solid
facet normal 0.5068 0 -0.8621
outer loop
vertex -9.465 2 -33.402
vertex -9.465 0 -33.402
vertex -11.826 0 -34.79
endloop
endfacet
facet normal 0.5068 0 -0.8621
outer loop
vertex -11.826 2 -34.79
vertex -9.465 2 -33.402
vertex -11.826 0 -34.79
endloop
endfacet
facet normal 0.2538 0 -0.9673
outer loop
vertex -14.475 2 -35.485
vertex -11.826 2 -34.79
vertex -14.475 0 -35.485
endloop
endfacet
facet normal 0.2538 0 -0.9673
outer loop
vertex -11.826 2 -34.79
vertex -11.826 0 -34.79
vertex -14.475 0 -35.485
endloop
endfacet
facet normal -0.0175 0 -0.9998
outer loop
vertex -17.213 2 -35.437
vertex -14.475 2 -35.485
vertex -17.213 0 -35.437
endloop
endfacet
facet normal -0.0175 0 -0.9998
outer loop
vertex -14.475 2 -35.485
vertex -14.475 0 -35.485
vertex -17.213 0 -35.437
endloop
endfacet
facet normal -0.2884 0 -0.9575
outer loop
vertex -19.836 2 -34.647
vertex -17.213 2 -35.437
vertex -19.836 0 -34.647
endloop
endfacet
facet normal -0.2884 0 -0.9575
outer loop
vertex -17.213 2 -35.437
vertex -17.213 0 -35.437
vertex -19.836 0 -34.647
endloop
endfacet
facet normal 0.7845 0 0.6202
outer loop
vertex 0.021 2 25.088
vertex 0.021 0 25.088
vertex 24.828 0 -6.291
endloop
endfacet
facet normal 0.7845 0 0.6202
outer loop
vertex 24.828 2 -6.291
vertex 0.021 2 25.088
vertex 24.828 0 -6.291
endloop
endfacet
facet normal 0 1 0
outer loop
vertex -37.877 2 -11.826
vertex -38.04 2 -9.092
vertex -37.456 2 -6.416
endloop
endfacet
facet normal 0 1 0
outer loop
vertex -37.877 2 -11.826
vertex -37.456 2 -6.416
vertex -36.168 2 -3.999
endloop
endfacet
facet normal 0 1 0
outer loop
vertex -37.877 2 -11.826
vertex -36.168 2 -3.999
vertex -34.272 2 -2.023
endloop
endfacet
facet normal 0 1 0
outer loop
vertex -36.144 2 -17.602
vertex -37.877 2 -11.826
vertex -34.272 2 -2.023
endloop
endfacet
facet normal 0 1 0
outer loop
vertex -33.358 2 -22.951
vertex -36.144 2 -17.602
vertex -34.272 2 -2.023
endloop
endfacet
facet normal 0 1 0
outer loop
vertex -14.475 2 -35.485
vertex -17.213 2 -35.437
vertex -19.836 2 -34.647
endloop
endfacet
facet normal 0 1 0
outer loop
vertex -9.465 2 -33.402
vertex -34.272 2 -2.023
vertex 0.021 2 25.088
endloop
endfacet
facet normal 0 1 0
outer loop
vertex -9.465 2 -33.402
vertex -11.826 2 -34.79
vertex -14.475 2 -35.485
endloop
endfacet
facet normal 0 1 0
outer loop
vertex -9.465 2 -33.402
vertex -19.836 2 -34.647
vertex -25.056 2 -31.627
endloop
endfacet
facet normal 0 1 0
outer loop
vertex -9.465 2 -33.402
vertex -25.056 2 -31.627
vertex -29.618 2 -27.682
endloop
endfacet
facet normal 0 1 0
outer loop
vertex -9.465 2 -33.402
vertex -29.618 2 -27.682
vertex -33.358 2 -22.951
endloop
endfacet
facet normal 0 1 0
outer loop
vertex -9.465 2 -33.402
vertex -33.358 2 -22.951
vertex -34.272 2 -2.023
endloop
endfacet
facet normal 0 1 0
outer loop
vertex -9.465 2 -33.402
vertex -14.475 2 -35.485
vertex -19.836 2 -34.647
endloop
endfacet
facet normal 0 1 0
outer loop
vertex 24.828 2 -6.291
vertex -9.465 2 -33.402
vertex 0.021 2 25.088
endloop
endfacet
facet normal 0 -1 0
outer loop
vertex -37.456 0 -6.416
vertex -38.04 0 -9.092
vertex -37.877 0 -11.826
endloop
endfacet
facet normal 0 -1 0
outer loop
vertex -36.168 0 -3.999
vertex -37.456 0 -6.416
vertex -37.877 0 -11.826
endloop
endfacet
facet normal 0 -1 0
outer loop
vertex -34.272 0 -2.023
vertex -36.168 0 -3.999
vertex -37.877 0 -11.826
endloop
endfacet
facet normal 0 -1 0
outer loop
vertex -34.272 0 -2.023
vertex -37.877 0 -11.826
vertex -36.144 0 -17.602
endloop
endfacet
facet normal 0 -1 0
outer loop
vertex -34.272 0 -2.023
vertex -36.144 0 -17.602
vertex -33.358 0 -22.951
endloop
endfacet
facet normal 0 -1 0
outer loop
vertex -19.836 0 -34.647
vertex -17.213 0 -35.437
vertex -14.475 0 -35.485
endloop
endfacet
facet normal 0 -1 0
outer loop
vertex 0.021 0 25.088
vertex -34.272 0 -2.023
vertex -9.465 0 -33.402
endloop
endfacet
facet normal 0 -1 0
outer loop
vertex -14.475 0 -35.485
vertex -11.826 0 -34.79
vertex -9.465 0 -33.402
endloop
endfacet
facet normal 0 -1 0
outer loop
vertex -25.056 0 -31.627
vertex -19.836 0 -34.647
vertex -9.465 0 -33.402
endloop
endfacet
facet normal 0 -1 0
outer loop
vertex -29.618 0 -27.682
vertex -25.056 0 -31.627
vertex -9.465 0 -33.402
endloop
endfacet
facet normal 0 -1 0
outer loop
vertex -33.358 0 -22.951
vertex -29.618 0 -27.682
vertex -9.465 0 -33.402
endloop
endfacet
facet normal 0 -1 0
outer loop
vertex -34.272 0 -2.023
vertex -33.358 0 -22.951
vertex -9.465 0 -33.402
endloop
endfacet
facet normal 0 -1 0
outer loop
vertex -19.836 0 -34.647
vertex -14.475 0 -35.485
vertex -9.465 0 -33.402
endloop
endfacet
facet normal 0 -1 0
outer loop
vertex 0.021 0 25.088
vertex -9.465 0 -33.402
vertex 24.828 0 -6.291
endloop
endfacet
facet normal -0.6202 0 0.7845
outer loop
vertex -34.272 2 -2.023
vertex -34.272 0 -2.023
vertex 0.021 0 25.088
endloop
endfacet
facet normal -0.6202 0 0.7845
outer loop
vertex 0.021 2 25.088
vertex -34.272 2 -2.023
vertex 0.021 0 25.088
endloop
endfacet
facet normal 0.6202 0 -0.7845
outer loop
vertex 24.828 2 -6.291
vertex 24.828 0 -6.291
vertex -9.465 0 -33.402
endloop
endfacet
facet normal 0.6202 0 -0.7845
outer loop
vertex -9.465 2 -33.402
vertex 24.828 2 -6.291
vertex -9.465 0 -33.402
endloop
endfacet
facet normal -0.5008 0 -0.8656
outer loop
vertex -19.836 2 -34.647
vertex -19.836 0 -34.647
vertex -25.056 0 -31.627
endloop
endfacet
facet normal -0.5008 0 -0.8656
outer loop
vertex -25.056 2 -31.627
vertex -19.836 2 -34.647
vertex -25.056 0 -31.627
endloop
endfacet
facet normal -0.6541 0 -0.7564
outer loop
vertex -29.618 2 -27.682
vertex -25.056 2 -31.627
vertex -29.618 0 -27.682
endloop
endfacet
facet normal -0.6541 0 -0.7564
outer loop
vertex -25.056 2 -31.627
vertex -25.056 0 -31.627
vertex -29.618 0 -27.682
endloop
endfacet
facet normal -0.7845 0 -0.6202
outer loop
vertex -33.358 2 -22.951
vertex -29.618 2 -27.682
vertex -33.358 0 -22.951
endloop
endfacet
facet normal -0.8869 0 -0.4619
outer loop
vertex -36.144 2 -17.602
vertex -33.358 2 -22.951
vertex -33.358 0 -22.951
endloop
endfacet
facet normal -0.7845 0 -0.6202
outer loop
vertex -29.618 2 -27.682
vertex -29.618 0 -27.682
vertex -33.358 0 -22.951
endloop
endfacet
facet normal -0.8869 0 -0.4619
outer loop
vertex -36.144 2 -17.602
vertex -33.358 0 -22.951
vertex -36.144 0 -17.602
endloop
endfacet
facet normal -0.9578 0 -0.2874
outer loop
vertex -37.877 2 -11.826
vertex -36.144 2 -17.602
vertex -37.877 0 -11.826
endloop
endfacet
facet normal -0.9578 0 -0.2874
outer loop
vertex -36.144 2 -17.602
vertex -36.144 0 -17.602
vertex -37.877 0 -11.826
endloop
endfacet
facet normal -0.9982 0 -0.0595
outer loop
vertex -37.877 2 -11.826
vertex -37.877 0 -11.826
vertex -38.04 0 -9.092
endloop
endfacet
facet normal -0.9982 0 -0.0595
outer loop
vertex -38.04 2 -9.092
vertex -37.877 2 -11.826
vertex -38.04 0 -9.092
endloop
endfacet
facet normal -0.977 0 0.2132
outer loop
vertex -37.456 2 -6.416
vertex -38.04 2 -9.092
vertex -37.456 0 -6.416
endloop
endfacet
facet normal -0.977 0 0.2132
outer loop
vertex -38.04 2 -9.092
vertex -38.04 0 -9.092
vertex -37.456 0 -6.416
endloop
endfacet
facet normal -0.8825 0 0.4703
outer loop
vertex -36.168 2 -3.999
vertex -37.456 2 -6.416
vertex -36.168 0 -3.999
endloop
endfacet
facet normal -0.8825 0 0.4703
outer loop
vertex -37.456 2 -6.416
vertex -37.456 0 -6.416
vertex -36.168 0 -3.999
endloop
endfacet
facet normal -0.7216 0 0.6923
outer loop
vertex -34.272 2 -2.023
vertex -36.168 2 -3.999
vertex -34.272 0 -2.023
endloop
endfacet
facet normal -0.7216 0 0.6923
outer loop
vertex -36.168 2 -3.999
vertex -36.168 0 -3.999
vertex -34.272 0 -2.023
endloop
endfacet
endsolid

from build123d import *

# Parameters (mm, degrees)
BOSS_EXTRUDE1_DEPTH = 2


with BuildPart() as part:
    # Sketch1 → Boss-Extrude1 (new body)
    with BuildSketch(Plane(origin=(0, 0, 0), x_dir=(1, 0, 0), z_dir=(0, 1, 0))):
        with BuildLine():
            Line((-34.272006578, 2.022637666), (0.021174984, -25.087844423))
            Line((0.021174984, -25.087844423), (24.827751164, 6.291030289))
            Line((24.827751164, 6.291030289), (-9.465430397, 33.401512378))
            ThreePointArc((-9.465430397, 33.401512378), (-14.475065348, 35.485495243), (-19.835620944, 34.646525273))
            ThreePointArc((-19.835620944, 34.646525273), (-31.599371908, 25.404645185), (-37.876767257, 11.825525482))
            ThreePointArc((-37.876767257, 11.825525482), (-37.455913062, 6.416060752), (-34.272006578, 2.022637666))
        make_face()
    extrude(amount=BOSS_EXTRUDE1_DEPTH)


solid = part.part
